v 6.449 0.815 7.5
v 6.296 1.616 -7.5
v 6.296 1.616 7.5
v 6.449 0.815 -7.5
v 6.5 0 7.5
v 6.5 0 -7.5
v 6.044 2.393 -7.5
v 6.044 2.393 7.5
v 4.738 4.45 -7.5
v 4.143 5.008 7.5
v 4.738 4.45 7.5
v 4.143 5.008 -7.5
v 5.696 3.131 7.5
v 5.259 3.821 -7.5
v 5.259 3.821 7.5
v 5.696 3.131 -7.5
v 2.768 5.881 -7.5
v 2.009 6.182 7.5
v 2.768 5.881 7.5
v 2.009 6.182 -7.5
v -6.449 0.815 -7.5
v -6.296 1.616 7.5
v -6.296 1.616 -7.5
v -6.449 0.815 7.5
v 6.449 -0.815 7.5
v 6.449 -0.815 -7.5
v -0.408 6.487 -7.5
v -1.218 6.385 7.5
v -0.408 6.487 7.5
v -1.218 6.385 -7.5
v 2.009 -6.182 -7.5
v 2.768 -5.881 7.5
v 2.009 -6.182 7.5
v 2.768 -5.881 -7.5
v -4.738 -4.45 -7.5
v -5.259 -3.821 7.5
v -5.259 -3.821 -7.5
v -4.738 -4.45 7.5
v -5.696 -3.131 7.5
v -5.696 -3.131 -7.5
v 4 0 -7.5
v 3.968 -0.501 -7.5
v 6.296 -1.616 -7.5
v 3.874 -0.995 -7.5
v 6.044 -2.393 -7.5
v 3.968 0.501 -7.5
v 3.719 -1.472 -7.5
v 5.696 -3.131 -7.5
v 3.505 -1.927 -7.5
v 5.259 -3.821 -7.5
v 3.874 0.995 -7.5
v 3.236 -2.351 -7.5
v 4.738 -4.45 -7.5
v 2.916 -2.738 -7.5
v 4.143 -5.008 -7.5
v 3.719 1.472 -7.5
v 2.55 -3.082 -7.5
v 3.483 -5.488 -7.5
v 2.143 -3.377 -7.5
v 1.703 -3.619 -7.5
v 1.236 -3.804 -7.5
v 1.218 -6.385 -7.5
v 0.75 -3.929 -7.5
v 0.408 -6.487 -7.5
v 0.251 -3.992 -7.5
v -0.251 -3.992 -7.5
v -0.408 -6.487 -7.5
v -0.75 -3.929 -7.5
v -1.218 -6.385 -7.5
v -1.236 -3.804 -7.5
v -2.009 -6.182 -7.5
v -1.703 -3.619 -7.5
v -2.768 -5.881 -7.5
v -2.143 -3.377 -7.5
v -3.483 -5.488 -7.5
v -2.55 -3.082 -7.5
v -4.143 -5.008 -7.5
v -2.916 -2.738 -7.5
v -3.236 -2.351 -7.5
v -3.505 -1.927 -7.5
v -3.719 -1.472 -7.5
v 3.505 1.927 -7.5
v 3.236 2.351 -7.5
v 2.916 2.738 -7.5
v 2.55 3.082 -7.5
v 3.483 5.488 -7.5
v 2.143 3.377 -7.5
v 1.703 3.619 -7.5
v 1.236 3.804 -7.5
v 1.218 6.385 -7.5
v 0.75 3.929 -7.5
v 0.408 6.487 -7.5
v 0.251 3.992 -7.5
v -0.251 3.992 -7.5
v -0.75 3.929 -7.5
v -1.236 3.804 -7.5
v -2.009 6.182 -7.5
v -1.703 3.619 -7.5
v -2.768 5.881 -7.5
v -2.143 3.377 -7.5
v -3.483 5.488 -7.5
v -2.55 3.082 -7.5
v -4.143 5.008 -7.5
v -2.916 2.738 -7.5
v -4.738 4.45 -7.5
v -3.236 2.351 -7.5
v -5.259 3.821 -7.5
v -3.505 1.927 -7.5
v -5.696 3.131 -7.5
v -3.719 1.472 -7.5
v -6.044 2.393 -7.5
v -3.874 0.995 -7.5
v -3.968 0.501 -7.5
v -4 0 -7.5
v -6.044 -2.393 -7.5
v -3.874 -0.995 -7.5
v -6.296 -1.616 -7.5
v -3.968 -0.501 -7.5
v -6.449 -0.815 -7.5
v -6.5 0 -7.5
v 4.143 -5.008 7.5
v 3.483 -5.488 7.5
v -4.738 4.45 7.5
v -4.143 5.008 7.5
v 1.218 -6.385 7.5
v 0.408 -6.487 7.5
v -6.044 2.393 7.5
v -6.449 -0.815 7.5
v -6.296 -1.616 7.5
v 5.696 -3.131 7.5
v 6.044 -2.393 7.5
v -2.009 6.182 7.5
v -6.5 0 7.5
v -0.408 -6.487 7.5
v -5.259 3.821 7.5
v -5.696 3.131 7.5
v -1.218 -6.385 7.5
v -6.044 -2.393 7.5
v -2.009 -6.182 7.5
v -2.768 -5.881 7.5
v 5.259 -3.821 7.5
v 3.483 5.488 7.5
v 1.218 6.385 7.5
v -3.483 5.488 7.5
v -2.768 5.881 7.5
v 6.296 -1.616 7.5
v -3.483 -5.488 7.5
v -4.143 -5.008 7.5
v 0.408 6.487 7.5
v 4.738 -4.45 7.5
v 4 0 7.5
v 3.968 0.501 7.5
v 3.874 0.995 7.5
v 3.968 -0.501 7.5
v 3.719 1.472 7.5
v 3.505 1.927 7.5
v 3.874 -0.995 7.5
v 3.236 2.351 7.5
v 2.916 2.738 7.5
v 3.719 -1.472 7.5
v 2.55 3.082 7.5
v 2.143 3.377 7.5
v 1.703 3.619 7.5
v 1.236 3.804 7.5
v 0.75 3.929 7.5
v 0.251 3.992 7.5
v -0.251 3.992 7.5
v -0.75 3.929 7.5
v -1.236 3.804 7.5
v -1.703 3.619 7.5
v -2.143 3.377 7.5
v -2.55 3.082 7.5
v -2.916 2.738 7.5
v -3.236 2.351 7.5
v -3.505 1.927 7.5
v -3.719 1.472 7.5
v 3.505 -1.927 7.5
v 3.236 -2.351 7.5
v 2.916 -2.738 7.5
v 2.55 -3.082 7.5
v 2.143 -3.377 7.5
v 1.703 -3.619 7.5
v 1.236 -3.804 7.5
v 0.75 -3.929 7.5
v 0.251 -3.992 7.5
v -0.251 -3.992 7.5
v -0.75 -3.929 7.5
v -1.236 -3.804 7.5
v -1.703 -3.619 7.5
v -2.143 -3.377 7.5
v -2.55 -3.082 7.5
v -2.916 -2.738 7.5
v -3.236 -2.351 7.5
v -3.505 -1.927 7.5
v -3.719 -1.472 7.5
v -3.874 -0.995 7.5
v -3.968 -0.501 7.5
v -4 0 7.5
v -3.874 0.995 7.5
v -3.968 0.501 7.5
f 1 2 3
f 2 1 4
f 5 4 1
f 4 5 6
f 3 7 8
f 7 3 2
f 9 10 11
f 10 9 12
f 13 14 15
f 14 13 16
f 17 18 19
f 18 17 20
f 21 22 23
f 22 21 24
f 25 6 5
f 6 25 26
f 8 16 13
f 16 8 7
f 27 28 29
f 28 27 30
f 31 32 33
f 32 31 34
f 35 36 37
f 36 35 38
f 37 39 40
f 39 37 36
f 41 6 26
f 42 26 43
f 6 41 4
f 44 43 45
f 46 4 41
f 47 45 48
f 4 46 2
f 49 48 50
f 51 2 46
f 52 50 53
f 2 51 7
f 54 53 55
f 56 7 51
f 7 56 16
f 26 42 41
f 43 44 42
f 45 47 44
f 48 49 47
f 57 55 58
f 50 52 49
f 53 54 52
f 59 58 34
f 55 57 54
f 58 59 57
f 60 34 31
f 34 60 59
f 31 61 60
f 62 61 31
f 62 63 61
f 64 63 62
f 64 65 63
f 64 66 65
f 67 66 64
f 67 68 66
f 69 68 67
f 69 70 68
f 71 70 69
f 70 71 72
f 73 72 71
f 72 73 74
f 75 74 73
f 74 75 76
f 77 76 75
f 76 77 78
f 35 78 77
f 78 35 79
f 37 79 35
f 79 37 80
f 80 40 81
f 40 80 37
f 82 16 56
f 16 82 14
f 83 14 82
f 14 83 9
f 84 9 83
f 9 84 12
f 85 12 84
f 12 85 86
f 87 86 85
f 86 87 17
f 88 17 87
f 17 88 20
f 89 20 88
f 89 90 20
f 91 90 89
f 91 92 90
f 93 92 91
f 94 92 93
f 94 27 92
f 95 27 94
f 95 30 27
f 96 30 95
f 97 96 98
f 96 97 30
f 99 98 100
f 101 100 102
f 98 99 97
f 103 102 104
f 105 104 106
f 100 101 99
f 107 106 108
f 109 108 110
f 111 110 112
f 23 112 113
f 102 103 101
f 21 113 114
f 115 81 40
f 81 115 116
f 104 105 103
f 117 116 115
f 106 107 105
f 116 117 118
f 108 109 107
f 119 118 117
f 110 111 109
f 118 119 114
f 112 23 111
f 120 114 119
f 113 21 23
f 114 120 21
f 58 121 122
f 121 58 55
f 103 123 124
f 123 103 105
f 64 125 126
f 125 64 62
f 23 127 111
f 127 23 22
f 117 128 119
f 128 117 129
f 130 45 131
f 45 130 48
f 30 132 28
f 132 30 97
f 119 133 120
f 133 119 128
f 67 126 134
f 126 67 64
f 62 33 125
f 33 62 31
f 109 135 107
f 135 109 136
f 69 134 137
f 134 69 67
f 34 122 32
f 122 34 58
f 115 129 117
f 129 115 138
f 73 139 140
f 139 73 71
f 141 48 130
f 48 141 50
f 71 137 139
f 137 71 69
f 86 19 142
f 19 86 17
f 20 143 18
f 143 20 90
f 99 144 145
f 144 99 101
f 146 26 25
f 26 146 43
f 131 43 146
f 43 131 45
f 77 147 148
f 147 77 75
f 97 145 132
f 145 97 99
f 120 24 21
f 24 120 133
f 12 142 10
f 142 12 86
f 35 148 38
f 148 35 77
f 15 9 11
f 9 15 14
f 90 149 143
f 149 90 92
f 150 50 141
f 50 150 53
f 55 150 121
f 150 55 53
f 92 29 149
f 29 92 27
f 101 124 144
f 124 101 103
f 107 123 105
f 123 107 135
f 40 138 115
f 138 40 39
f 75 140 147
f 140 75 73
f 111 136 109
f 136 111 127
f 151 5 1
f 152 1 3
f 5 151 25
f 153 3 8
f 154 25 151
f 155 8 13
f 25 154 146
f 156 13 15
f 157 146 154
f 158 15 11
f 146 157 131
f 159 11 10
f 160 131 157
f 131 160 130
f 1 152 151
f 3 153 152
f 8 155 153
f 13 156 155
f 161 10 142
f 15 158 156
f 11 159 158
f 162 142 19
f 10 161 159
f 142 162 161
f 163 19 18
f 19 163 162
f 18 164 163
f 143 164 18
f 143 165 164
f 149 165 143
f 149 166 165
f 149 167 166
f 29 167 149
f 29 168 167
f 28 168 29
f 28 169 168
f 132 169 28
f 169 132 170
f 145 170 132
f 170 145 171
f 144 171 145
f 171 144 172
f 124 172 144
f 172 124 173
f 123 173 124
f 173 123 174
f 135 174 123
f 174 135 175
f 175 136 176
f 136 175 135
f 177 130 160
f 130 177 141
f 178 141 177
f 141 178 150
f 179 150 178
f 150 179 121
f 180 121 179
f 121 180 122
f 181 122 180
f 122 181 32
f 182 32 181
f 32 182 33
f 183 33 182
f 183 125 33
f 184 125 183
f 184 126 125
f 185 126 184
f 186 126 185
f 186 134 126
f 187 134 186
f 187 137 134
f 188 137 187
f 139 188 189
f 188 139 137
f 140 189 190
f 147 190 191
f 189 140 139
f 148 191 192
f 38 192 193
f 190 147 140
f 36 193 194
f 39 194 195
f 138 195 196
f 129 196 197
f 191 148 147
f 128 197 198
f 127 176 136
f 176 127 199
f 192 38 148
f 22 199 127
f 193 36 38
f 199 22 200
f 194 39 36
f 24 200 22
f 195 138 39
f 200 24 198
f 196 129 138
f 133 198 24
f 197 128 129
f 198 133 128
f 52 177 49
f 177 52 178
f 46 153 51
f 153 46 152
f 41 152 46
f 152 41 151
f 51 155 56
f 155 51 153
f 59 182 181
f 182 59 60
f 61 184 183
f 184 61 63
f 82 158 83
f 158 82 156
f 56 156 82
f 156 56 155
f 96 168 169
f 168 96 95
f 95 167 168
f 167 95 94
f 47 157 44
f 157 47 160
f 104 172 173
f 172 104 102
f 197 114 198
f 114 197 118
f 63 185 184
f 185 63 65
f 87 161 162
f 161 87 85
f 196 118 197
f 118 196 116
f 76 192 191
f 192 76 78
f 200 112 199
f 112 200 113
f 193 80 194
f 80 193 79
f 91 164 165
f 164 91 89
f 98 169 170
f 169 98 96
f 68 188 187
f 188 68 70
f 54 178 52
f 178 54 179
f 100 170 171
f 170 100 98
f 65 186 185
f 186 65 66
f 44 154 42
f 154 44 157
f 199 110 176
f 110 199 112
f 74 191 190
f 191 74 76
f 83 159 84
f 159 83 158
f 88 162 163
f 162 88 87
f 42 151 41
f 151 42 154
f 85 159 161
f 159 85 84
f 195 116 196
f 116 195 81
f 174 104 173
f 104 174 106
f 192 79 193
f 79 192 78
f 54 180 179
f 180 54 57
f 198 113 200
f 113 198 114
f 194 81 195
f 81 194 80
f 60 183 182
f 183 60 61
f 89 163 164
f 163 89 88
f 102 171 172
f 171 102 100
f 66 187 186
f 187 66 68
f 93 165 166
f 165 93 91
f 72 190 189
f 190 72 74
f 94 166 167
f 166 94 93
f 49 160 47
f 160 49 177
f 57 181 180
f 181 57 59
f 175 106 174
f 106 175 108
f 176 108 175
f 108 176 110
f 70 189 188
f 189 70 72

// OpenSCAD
$fn = 50;


difference() {
	union() {
		translate(v = [0, 0, -7.5000000000]) {
			cylinder(h = 15, r = 6.5000000000);
		}
	}
	union() {
		translate(v = [0, 0, -100.0000000000]) {
			cylinder(h = 200, r = 4.0000000000);
		}
	}
}
